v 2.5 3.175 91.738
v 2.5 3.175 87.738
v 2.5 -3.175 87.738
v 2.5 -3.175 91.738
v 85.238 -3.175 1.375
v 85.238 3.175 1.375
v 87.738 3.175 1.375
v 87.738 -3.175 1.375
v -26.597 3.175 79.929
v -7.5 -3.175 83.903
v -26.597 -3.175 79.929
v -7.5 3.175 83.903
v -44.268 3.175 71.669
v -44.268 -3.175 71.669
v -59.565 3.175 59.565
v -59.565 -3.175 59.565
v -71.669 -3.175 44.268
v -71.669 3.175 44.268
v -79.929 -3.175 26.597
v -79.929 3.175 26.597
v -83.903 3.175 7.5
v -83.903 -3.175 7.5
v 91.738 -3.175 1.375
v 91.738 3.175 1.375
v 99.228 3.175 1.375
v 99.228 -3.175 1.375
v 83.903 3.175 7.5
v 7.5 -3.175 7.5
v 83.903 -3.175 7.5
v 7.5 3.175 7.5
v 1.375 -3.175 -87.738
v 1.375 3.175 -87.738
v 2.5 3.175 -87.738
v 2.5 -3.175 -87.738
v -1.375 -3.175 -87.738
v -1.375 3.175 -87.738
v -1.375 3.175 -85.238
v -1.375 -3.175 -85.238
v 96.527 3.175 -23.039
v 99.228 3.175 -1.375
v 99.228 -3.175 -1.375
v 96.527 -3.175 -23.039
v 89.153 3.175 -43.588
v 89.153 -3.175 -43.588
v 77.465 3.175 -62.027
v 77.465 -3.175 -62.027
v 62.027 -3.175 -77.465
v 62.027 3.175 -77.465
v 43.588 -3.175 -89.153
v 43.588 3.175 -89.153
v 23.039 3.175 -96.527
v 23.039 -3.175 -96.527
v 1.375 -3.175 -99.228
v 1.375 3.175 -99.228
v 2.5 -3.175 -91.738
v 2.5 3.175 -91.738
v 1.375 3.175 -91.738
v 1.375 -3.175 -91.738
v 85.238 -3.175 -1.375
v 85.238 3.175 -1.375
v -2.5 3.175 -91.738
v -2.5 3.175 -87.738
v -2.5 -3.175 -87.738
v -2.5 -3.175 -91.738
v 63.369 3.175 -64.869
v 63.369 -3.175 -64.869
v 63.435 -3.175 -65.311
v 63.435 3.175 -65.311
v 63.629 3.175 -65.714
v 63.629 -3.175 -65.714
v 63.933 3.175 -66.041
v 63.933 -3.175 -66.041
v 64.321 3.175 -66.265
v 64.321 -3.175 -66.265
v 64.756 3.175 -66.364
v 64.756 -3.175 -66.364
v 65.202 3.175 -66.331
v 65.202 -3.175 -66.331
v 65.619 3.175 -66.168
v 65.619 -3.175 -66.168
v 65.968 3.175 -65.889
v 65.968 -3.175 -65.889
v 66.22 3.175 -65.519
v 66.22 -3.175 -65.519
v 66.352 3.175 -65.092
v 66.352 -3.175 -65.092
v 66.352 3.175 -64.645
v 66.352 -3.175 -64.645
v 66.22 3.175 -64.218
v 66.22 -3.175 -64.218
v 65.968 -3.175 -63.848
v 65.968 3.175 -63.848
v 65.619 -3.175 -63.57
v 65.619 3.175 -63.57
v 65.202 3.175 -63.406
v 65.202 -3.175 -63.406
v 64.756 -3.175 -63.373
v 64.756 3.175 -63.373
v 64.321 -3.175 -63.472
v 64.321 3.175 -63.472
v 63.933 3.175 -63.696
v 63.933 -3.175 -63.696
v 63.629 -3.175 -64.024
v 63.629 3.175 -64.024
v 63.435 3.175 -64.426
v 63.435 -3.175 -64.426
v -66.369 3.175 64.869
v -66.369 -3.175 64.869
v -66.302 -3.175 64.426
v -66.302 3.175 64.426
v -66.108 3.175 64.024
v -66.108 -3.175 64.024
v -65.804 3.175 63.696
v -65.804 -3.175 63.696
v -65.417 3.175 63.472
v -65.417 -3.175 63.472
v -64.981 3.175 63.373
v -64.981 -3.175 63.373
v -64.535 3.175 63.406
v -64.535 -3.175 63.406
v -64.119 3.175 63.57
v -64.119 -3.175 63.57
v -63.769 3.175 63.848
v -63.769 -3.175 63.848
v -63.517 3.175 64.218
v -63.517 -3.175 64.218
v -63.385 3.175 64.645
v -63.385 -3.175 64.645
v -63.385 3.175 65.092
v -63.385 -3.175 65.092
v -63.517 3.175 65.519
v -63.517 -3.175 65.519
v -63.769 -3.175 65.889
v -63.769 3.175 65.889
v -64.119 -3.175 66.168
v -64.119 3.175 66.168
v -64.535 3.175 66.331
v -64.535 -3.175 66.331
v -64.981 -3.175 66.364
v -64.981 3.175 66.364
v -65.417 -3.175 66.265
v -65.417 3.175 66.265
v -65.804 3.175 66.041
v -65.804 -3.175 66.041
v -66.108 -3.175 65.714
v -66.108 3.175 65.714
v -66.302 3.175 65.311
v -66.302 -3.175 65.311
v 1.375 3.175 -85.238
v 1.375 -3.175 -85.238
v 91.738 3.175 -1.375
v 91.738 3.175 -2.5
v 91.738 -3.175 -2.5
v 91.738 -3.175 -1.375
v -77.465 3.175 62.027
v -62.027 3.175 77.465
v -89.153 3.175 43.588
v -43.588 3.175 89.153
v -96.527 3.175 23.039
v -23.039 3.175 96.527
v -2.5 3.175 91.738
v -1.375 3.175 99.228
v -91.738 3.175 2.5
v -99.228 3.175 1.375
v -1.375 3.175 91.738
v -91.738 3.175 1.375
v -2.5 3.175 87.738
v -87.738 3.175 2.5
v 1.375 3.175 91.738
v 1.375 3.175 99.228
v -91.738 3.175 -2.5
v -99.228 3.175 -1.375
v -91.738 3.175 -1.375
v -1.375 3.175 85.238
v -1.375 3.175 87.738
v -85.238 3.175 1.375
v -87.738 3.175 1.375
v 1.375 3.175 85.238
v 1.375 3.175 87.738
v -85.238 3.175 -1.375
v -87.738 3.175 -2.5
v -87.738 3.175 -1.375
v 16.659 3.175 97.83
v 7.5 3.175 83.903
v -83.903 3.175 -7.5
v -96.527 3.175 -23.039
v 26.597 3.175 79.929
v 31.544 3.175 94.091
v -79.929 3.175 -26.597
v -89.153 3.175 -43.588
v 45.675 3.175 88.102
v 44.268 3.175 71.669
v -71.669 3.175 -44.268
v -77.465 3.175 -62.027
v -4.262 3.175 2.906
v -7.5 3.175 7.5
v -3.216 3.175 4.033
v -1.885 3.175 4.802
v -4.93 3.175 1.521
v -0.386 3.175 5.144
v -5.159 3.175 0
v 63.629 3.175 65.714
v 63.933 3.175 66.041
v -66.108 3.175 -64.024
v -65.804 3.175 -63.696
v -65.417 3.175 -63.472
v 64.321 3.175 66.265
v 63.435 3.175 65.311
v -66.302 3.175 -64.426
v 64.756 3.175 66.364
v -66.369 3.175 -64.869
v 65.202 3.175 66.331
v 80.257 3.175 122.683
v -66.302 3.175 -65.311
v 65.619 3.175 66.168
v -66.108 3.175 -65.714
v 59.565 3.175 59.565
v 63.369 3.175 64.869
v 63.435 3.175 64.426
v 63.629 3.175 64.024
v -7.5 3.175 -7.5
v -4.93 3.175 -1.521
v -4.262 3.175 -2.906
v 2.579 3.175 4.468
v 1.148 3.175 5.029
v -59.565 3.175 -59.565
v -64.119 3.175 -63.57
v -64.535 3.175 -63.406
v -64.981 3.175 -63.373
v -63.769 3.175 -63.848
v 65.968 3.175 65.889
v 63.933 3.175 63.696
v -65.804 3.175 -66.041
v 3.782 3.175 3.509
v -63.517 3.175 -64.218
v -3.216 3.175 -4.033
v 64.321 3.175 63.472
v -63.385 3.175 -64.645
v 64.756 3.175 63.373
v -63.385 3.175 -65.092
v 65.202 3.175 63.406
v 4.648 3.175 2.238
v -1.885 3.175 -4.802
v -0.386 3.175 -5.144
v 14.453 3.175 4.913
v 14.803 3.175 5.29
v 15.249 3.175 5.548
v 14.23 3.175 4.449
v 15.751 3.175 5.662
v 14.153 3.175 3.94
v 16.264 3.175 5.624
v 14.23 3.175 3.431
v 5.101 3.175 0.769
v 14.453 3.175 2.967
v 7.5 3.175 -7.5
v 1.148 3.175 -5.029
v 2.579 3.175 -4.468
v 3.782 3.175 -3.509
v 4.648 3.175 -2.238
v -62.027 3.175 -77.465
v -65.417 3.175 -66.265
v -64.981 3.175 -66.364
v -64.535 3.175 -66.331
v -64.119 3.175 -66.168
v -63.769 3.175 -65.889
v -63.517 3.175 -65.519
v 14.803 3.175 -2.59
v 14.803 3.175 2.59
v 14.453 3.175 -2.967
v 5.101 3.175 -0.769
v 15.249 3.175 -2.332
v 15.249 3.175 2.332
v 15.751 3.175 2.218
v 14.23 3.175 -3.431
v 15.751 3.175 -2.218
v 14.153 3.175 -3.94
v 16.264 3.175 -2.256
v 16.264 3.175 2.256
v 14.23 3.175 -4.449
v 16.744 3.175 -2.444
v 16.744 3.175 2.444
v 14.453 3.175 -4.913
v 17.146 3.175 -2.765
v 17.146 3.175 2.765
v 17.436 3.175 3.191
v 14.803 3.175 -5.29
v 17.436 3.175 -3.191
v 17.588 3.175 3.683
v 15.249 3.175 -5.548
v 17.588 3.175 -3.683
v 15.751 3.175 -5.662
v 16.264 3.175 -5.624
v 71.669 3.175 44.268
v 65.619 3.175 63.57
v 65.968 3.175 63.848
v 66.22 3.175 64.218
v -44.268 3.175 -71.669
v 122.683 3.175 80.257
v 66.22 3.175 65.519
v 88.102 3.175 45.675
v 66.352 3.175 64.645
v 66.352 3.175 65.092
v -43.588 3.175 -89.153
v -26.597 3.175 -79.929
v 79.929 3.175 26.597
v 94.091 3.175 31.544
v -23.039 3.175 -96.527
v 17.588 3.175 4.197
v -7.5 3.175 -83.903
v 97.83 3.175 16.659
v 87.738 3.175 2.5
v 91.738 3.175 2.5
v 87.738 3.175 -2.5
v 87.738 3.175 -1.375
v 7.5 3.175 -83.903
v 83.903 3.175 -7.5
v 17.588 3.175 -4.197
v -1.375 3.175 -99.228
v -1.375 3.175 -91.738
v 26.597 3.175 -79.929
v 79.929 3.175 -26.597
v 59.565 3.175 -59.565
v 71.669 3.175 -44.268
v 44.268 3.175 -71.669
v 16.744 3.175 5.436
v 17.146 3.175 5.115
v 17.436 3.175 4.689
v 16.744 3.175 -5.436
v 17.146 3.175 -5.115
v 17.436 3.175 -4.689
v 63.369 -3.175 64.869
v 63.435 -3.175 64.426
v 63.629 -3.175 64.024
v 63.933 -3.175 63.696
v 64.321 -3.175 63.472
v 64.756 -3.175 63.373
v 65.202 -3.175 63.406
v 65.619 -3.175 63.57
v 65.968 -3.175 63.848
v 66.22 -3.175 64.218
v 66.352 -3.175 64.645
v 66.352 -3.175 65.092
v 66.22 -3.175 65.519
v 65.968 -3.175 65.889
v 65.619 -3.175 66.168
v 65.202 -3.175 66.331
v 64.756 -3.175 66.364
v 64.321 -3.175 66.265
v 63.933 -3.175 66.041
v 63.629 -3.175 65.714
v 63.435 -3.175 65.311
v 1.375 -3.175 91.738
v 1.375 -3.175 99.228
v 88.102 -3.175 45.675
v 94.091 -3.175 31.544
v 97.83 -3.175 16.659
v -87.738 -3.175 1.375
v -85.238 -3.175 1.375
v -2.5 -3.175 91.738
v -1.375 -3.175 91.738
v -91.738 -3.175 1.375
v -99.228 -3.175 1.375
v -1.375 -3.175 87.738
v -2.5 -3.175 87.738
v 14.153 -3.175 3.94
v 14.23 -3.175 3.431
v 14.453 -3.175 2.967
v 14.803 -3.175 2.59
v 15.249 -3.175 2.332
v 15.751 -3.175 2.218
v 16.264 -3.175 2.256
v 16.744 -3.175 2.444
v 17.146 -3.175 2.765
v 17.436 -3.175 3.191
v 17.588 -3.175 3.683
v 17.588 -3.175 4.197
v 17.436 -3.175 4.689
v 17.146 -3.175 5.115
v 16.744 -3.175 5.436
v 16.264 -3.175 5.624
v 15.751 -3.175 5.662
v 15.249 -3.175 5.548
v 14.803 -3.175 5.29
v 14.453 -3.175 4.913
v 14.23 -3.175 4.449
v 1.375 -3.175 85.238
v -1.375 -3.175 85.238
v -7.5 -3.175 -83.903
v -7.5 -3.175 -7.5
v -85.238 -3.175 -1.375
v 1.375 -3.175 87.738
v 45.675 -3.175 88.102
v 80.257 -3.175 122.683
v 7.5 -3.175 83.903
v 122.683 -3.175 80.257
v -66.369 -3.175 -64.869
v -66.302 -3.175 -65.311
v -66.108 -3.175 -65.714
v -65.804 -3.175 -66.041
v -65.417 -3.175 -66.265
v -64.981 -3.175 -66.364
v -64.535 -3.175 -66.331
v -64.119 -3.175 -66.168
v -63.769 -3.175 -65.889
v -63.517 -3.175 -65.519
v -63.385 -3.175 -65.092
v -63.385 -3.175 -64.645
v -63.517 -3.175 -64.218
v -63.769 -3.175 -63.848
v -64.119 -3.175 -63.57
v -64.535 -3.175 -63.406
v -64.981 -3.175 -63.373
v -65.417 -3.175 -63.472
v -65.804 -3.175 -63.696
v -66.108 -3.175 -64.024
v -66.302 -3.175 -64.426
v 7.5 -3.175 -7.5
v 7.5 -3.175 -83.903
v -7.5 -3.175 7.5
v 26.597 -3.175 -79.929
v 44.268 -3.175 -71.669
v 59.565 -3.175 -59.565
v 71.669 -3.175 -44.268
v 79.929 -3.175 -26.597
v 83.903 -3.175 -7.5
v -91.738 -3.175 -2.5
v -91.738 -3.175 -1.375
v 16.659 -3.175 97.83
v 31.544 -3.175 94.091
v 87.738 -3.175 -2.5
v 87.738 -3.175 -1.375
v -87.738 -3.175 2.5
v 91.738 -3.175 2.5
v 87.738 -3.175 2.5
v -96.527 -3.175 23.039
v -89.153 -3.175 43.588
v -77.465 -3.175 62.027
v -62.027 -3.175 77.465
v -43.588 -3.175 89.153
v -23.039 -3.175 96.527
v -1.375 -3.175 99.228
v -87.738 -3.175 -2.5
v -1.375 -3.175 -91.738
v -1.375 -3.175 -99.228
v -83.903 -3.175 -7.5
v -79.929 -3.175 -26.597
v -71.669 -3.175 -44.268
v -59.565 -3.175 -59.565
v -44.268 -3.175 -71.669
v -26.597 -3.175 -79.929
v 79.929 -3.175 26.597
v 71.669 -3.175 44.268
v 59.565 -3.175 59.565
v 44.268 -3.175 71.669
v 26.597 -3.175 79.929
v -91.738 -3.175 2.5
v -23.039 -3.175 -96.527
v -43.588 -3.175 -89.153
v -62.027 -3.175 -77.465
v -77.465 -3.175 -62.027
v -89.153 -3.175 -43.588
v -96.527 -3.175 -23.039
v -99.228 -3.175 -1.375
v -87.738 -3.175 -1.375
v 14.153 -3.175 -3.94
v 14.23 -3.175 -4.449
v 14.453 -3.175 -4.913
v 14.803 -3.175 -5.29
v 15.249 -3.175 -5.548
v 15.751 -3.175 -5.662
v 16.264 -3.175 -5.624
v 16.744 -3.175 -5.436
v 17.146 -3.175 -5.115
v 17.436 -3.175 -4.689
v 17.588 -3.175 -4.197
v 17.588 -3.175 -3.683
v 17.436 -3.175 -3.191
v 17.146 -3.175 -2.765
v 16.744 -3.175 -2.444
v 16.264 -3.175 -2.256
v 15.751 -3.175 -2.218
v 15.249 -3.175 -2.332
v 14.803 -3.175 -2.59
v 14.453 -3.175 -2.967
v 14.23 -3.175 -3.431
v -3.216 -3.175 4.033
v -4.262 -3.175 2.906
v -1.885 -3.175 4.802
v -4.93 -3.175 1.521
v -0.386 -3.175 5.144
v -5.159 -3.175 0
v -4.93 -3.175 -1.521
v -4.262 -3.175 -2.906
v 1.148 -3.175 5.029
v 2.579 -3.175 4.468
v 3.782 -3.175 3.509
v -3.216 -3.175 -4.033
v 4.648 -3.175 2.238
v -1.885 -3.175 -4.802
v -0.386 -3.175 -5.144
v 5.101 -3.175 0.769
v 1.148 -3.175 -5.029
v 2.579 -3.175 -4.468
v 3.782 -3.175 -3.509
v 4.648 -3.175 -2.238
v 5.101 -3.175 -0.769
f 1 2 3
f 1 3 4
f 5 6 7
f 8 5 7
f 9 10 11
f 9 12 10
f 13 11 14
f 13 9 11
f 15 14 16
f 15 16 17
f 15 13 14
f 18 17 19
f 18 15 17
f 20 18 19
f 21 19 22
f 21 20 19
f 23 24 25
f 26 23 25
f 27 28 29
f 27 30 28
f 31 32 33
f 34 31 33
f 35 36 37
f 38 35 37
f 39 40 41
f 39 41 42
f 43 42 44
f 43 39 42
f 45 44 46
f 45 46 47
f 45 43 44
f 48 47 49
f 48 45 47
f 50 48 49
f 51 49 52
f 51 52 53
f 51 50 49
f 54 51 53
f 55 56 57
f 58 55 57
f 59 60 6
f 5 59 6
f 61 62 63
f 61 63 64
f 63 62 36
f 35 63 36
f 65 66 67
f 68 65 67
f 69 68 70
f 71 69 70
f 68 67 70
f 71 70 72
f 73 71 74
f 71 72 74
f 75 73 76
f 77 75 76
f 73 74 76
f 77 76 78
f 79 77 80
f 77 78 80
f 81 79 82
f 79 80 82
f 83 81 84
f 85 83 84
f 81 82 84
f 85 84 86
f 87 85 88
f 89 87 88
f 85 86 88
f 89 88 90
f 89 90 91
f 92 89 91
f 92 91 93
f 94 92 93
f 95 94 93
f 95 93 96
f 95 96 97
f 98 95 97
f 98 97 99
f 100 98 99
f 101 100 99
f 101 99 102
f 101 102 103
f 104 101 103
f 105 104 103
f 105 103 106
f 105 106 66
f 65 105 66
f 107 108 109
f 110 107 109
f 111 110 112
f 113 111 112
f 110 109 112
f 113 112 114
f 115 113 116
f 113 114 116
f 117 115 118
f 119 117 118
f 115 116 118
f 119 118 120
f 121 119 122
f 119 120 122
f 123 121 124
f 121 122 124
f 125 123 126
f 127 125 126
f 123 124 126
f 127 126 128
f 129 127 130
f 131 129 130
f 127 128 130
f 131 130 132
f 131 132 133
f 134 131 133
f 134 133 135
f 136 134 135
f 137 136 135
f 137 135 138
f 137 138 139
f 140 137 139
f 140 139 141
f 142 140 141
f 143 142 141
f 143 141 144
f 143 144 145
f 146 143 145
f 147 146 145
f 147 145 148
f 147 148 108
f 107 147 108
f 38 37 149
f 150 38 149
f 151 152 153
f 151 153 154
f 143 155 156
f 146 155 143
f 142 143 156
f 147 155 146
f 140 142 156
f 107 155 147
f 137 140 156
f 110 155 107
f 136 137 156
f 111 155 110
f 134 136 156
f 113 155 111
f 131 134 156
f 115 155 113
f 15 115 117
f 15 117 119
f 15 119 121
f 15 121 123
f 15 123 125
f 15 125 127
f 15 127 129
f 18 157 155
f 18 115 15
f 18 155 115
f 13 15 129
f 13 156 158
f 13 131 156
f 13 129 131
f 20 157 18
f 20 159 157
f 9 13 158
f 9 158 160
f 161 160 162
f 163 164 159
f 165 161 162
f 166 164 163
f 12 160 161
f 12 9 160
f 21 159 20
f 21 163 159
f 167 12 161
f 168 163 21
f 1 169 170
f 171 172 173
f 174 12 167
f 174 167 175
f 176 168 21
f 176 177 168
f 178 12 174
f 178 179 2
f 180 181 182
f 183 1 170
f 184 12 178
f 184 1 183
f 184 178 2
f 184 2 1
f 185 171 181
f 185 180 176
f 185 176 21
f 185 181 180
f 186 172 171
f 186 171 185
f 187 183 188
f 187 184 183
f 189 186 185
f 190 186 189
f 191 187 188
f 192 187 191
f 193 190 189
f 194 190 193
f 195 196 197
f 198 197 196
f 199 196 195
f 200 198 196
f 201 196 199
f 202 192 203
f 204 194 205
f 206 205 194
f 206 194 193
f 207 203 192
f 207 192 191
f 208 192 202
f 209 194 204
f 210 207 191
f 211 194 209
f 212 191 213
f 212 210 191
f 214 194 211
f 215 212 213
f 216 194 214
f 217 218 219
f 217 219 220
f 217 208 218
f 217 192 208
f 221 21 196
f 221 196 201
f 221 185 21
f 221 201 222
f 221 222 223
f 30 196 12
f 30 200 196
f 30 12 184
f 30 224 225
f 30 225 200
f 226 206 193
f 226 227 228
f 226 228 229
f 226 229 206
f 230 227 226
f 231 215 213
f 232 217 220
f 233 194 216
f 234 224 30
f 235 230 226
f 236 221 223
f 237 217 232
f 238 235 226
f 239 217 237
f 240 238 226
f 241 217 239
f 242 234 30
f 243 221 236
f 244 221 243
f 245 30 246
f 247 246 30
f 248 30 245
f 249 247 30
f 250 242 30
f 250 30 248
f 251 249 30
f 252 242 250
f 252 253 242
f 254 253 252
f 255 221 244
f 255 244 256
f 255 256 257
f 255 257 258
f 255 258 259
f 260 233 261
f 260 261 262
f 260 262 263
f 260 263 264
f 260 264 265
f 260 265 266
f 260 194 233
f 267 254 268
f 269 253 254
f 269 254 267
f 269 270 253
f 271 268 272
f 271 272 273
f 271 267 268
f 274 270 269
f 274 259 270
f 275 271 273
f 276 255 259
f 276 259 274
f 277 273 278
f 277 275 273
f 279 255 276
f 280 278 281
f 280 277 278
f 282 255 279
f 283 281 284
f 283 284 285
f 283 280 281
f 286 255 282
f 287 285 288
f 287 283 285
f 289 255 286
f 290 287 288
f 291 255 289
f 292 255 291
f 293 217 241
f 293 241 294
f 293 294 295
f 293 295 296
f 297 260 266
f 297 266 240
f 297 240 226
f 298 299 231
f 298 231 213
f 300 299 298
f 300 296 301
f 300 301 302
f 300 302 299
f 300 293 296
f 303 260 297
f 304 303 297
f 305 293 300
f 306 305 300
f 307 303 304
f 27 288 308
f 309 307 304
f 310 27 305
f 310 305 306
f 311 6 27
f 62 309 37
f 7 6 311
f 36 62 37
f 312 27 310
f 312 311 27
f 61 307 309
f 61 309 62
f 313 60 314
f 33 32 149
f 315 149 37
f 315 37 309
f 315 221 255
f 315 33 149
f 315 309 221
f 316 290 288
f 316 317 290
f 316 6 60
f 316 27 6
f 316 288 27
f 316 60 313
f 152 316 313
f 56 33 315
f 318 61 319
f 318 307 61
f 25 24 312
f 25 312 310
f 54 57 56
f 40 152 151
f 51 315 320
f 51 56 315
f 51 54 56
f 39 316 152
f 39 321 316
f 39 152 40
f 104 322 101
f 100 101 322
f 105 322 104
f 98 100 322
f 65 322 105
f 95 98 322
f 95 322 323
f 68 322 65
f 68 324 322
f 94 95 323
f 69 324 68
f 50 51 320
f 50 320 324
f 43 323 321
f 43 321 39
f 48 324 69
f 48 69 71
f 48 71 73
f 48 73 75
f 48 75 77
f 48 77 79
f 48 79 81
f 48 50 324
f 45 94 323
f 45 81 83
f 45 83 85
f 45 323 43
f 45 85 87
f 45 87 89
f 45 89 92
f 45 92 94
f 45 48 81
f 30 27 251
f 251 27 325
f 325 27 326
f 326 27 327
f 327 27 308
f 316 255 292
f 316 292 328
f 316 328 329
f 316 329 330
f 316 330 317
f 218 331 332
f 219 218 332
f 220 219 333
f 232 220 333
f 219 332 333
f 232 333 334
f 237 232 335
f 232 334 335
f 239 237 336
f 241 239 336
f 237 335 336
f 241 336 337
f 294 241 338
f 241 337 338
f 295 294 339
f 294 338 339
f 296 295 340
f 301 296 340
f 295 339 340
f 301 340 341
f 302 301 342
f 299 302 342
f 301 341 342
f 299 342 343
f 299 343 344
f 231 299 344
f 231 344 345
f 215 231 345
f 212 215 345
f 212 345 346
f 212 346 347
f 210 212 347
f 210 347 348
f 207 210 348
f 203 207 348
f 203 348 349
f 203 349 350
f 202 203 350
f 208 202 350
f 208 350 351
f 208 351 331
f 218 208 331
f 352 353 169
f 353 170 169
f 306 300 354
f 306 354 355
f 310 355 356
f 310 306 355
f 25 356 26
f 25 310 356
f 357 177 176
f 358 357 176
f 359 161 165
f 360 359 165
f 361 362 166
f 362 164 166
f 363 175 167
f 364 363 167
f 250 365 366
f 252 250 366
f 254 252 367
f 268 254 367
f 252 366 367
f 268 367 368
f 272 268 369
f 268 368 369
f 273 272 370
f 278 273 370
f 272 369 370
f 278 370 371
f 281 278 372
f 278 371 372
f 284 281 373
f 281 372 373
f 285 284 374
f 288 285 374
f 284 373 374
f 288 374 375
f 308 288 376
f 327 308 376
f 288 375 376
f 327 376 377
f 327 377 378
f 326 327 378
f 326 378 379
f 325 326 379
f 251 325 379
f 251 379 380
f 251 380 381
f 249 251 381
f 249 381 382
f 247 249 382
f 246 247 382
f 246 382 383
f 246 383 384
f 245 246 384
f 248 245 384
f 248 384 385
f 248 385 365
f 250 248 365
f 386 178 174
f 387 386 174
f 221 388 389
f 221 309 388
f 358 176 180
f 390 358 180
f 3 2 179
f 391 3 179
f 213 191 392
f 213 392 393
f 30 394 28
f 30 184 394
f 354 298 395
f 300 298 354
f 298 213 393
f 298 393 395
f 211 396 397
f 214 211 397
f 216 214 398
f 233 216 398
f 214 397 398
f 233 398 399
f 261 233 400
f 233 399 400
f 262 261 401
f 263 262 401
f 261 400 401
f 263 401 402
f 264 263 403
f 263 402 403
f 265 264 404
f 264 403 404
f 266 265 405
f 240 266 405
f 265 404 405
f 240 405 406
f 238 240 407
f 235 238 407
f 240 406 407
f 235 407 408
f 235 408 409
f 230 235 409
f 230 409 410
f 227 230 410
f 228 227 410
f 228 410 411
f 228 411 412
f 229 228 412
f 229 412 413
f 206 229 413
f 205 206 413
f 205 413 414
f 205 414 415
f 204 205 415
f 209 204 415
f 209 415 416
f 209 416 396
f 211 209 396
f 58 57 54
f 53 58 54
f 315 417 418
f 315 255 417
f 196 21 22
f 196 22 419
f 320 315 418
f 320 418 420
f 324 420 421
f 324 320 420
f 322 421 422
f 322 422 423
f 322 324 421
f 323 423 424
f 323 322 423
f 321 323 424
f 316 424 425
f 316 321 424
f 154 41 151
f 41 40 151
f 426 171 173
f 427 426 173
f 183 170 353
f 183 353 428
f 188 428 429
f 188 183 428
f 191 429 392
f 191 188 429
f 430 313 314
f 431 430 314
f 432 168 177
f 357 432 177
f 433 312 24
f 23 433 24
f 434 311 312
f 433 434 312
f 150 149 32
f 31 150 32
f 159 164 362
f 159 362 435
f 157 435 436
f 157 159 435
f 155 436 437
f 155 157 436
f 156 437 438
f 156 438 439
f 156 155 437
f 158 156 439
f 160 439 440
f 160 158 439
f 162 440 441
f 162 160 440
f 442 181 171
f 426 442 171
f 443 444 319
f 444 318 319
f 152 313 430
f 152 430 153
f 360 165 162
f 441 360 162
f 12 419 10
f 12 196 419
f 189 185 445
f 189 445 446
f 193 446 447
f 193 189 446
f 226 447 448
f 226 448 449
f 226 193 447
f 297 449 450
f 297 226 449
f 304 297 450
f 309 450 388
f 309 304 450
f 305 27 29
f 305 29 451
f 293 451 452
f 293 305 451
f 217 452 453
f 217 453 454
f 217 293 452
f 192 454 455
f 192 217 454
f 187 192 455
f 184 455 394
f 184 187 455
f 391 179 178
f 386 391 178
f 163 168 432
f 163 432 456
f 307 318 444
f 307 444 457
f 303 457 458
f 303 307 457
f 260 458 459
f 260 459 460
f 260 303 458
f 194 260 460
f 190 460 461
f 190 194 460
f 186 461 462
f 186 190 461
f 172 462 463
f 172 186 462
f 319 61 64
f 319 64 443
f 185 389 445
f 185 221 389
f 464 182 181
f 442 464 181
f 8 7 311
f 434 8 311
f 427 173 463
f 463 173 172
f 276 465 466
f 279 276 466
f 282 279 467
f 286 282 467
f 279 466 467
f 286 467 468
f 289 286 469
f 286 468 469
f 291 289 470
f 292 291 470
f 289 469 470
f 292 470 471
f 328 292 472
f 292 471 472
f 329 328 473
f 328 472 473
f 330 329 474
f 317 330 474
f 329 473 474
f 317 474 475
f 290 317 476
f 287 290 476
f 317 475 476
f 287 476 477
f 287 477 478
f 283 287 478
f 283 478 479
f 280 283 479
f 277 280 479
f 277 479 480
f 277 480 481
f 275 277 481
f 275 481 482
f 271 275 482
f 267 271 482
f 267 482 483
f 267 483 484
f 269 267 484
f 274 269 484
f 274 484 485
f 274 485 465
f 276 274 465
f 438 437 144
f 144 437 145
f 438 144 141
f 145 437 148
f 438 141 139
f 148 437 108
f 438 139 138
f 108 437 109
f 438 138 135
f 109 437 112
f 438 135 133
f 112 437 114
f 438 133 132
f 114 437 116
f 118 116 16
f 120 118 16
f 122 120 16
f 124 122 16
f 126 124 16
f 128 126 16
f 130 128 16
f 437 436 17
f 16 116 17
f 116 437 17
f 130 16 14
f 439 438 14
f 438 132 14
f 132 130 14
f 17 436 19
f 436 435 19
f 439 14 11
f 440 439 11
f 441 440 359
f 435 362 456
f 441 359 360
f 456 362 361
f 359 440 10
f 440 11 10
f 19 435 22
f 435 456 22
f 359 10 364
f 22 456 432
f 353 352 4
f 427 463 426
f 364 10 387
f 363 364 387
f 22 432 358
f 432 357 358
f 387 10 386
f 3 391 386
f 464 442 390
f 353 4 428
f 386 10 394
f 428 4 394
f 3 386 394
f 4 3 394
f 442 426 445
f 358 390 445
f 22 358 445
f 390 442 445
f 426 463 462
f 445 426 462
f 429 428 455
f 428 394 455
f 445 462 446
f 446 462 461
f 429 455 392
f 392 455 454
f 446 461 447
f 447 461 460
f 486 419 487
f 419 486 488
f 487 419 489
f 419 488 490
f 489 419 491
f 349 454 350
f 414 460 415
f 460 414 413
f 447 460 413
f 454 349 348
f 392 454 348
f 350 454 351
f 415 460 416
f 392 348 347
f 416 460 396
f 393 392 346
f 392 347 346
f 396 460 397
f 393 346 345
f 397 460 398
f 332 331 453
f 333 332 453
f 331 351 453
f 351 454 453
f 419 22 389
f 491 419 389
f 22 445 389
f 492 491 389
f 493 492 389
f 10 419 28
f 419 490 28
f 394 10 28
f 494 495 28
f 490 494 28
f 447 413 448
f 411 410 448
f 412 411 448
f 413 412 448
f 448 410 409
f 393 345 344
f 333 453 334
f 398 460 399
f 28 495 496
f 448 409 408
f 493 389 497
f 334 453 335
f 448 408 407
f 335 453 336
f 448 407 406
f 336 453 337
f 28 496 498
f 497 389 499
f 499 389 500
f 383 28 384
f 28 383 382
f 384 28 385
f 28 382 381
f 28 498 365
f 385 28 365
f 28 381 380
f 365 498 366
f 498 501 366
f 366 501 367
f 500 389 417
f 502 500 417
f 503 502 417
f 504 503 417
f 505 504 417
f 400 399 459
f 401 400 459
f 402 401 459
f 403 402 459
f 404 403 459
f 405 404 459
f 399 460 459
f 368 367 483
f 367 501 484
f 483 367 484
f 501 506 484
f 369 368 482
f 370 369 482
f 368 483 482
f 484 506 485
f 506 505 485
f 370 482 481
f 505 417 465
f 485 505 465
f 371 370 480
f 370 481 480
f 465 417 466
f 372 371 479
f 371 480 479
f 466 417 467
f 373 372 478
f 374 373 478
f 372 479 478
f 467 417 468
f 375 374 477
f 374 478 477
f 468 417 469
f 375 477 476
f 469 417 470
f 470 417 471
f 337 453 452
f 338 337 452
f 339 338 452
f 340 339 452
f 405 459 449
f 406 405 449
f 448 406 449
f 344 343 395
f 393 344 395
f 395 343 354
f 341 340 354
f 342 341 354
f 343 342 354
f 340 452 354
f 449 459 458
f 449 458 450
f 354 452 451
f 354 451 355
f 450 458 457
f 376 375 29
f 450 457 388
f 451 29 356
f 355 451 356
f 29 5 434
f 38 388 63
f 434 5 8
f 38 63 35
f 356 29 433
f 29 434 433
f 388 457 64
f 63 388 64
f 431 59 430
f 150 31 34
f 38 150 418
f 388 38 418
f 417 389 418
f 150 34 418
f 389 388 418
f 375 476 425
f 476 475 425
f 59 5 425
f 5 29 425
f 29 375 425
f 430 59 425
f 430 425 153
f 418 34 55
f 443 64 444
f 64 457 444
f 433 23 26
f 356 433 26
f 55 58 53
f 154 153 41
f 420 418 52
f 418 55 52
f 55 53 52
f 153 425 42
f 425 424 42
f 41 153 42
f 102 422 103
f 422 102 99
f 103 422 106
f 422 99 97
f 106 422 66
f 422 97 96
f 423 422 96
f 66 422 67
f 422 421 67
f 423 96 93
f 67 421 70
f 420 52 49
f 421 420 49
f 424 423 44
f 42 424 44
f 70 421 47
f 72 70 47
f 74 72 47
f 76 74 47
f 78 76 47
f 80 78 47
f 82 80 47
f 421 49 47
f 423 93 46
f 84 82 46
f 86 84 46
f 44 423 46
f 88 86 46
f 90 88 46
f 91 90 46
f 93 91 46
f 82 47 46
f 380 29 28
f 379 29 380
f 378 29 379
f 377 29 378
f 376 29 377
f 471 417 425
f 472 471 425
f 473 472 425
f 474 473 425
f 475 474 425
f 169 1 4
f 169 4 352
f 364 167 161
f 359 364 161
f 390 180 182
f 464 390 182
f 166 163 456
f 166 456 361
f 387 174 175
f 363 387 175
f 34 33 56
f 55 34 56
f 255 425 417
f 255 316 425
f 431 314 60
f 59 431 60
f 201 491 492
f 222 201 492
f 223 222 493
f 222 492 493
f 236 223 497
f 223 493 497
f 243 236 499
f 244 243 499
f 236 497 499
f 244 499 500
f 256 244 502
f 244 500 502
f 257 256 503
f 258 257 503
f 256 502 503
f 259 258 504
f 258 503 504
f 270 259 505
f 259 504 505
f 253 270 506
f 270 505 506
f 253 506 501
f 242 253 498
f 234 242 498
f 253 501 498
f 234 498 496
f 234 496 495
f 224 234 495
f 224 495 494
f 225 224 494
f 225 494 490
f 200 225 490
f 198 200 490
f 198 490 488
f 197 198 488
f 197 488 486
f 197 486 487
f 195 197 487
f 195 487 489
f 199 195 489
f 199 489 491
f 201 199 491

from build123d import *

# Parameters (mm, degrees)
BOSS_EXTRUDE1_DEPTH         = 3.175
SKETCH2_W                   = 2.75
SKETCH2_H                   = 2.5
SKETCH2_H_2                 = 4
SKETCH2_W_2                 = 1.125
SKETCH2_H_3                 = 7.5
CUT_EXTRUDE1_DEPTH          = 174.529048361
CIRPATTERN1_COUNT           = 4
F_3_0_3_DIAMETER_HOLE1_D    = 3
F_3_8_CLEARANCE_HOLE1_D     = 10.31748
F_3_8_CLEARANCE_HOLE1_DEPTH = 6.35
F_4_CLEARANCE_HOLE1_D       = 3.4544


with BuildPart() as part:
    # Sketch1 → Boss-Extrude1 (new, symmetric)
    with BuildSketch(Plane(origin=(0, 0, 0), x_dir=(1, 0, 0), z_dir=(0, 1, 0))):
        with BuildLine():
            ThreePointArc((88.101844639, -45.675437768), (-70.171862751, 70.171862751), (45.675437768, -88.101844639))
            Line((45.675437768, -88.101844639), (80.256619665, -122.683026536))
            Line((80.256619665, -122.683026536), (122.683026536, -80.256619665))
            Line((122.683026536, -80.256619665), (88.101844639, -45.675437768))
        make_face()
        with BuildLine():
            Line((-83.903460262, -7.5), (-7.5, -7.5))
            Line((-7.5, -7.5), (-7.5, -83.903460262))
            ThreePointArc((-7.5, -83.903460262), (-59.565261034, -59.565261034), (-83.903460262, -7.5))
        make_face(mode=Mode.SUBTRACT)
        with BuildLine():
            ThreePointArc((83.903460262, -7.5), (59.565261034, -59.565261034), (7.5, -83.903460262))
            Line((7.5, -83.903460262), (7.5, -7.5))
            Line((7.5, -7.5), (83.903460262, -7.5))
        make_face(mode=Mode.SUBTRACT)
        with BuildLine():
            ThreePointArc((-83.903460262, 7.5), (-59.565261034, 59.565261034), (-7.5, 83.903460262))
            Line((-7.5, 83.903460262), (-7.5, 7.5))
            Line((-7.5, 7.5), (-83.903460262, 7.5))
        make_face(mode=Mode.SUBTRACT)
        with BuildLine():
            ThreePointArc((7.5, 83.903460262), (59.565261034, 59.565261034), (83.903460262, 7.5))
            Line((83.903460262, 7.5), (7.5, 7.5))
            Line((7.5, 7.5), (7.5, 83.903460262))
        make_face(mode=Mode.SUBTRACT)
    extrude(amount=BOSS_EXTRUDE1_DEPTH, both=True)

    # Sketch2 → Cut-Extrude1 (cut, symmetric)
    with BuildSketch(Plane(origin=(0, 0, 0), x_dir=(1, 0, 0), z_dir=(0, 1, 0))):
        with Locations((0, 86.488)):
            Rectangle(SKETCH2_W, SKETCH2_H)
        with Locations((0, 89.738)):
            Rectangle(SKETCH2_W, SKETCH2_H_2)
        with Locations((1.9375, 89.738)):
            Rectangle(SKETCH2_W_2, SKETCH2_H_2)
        with Locations((0, 95.488)):
            Rectangle(SKETCH2_W, SKETCH2_H_3)
        with Locations((-1.9375, 89.738)):
            Rectangle(SKETCH2_W_2, SKETCH2_H_2)
    cut_extrude1 = extrude(amount=CUT_EXTRUDE1_DEPTH, both=True, mode=Mode.SUBTRACT)

    # CirPattern1: Cut-Extrude1 ×4 about axis
    cirpattern1_axis = Axis((0, 0, 0), (0, 1, 0))
    for i in range(1, CIRPATTERN1_COUNT):
        add(cut_extrude1.rotate(cirpattern1_axis, i * 360 / CIRPATTERN1_COUNT), mode=Mode.SUBTRACT)

    # Ø3.0 (3) Diameter Hole1 (through all)
    with Locations(Plane(origin=(0, 3.175, 0), x_dir=(1, 0, 0), z_dir=(0, 1, 0))):
        with Locations((-64.868561892, -64.868561892), (0, 0), (-64.868561892, 64.868561892), (64.868561892, 64.868561892), (64.868561892, -64.868561892)):
            Hole(F_3_0_3_DIAMETER_HOLE1_D / 2)

    # 3/8 Clearance Hole1
    with Locations(Plane(origin=(0, 3.175, 0), x_dir=(1, 0, 0), z_dir=(0, 1, 0))):
        with Locations((0, 0)):
            Hole(F_3_8_CLEARANCE_HOLE1_D / 2, depth=F_3_8_CLEARANCE_HOLE1_DEPTH)

    # #4 Clearance Hole1 (through all)
    with Locations(Plane(origin=(0, 3.175, 0), x_dir=(1, 0, 0), z_dir=(0, 1, 0))):
        with Locations((15.88, -3.94), (15.88, 3.94)):
            Hole(F_4_CLEARANCE_HOLE1_D / 2)


solid = part.part
